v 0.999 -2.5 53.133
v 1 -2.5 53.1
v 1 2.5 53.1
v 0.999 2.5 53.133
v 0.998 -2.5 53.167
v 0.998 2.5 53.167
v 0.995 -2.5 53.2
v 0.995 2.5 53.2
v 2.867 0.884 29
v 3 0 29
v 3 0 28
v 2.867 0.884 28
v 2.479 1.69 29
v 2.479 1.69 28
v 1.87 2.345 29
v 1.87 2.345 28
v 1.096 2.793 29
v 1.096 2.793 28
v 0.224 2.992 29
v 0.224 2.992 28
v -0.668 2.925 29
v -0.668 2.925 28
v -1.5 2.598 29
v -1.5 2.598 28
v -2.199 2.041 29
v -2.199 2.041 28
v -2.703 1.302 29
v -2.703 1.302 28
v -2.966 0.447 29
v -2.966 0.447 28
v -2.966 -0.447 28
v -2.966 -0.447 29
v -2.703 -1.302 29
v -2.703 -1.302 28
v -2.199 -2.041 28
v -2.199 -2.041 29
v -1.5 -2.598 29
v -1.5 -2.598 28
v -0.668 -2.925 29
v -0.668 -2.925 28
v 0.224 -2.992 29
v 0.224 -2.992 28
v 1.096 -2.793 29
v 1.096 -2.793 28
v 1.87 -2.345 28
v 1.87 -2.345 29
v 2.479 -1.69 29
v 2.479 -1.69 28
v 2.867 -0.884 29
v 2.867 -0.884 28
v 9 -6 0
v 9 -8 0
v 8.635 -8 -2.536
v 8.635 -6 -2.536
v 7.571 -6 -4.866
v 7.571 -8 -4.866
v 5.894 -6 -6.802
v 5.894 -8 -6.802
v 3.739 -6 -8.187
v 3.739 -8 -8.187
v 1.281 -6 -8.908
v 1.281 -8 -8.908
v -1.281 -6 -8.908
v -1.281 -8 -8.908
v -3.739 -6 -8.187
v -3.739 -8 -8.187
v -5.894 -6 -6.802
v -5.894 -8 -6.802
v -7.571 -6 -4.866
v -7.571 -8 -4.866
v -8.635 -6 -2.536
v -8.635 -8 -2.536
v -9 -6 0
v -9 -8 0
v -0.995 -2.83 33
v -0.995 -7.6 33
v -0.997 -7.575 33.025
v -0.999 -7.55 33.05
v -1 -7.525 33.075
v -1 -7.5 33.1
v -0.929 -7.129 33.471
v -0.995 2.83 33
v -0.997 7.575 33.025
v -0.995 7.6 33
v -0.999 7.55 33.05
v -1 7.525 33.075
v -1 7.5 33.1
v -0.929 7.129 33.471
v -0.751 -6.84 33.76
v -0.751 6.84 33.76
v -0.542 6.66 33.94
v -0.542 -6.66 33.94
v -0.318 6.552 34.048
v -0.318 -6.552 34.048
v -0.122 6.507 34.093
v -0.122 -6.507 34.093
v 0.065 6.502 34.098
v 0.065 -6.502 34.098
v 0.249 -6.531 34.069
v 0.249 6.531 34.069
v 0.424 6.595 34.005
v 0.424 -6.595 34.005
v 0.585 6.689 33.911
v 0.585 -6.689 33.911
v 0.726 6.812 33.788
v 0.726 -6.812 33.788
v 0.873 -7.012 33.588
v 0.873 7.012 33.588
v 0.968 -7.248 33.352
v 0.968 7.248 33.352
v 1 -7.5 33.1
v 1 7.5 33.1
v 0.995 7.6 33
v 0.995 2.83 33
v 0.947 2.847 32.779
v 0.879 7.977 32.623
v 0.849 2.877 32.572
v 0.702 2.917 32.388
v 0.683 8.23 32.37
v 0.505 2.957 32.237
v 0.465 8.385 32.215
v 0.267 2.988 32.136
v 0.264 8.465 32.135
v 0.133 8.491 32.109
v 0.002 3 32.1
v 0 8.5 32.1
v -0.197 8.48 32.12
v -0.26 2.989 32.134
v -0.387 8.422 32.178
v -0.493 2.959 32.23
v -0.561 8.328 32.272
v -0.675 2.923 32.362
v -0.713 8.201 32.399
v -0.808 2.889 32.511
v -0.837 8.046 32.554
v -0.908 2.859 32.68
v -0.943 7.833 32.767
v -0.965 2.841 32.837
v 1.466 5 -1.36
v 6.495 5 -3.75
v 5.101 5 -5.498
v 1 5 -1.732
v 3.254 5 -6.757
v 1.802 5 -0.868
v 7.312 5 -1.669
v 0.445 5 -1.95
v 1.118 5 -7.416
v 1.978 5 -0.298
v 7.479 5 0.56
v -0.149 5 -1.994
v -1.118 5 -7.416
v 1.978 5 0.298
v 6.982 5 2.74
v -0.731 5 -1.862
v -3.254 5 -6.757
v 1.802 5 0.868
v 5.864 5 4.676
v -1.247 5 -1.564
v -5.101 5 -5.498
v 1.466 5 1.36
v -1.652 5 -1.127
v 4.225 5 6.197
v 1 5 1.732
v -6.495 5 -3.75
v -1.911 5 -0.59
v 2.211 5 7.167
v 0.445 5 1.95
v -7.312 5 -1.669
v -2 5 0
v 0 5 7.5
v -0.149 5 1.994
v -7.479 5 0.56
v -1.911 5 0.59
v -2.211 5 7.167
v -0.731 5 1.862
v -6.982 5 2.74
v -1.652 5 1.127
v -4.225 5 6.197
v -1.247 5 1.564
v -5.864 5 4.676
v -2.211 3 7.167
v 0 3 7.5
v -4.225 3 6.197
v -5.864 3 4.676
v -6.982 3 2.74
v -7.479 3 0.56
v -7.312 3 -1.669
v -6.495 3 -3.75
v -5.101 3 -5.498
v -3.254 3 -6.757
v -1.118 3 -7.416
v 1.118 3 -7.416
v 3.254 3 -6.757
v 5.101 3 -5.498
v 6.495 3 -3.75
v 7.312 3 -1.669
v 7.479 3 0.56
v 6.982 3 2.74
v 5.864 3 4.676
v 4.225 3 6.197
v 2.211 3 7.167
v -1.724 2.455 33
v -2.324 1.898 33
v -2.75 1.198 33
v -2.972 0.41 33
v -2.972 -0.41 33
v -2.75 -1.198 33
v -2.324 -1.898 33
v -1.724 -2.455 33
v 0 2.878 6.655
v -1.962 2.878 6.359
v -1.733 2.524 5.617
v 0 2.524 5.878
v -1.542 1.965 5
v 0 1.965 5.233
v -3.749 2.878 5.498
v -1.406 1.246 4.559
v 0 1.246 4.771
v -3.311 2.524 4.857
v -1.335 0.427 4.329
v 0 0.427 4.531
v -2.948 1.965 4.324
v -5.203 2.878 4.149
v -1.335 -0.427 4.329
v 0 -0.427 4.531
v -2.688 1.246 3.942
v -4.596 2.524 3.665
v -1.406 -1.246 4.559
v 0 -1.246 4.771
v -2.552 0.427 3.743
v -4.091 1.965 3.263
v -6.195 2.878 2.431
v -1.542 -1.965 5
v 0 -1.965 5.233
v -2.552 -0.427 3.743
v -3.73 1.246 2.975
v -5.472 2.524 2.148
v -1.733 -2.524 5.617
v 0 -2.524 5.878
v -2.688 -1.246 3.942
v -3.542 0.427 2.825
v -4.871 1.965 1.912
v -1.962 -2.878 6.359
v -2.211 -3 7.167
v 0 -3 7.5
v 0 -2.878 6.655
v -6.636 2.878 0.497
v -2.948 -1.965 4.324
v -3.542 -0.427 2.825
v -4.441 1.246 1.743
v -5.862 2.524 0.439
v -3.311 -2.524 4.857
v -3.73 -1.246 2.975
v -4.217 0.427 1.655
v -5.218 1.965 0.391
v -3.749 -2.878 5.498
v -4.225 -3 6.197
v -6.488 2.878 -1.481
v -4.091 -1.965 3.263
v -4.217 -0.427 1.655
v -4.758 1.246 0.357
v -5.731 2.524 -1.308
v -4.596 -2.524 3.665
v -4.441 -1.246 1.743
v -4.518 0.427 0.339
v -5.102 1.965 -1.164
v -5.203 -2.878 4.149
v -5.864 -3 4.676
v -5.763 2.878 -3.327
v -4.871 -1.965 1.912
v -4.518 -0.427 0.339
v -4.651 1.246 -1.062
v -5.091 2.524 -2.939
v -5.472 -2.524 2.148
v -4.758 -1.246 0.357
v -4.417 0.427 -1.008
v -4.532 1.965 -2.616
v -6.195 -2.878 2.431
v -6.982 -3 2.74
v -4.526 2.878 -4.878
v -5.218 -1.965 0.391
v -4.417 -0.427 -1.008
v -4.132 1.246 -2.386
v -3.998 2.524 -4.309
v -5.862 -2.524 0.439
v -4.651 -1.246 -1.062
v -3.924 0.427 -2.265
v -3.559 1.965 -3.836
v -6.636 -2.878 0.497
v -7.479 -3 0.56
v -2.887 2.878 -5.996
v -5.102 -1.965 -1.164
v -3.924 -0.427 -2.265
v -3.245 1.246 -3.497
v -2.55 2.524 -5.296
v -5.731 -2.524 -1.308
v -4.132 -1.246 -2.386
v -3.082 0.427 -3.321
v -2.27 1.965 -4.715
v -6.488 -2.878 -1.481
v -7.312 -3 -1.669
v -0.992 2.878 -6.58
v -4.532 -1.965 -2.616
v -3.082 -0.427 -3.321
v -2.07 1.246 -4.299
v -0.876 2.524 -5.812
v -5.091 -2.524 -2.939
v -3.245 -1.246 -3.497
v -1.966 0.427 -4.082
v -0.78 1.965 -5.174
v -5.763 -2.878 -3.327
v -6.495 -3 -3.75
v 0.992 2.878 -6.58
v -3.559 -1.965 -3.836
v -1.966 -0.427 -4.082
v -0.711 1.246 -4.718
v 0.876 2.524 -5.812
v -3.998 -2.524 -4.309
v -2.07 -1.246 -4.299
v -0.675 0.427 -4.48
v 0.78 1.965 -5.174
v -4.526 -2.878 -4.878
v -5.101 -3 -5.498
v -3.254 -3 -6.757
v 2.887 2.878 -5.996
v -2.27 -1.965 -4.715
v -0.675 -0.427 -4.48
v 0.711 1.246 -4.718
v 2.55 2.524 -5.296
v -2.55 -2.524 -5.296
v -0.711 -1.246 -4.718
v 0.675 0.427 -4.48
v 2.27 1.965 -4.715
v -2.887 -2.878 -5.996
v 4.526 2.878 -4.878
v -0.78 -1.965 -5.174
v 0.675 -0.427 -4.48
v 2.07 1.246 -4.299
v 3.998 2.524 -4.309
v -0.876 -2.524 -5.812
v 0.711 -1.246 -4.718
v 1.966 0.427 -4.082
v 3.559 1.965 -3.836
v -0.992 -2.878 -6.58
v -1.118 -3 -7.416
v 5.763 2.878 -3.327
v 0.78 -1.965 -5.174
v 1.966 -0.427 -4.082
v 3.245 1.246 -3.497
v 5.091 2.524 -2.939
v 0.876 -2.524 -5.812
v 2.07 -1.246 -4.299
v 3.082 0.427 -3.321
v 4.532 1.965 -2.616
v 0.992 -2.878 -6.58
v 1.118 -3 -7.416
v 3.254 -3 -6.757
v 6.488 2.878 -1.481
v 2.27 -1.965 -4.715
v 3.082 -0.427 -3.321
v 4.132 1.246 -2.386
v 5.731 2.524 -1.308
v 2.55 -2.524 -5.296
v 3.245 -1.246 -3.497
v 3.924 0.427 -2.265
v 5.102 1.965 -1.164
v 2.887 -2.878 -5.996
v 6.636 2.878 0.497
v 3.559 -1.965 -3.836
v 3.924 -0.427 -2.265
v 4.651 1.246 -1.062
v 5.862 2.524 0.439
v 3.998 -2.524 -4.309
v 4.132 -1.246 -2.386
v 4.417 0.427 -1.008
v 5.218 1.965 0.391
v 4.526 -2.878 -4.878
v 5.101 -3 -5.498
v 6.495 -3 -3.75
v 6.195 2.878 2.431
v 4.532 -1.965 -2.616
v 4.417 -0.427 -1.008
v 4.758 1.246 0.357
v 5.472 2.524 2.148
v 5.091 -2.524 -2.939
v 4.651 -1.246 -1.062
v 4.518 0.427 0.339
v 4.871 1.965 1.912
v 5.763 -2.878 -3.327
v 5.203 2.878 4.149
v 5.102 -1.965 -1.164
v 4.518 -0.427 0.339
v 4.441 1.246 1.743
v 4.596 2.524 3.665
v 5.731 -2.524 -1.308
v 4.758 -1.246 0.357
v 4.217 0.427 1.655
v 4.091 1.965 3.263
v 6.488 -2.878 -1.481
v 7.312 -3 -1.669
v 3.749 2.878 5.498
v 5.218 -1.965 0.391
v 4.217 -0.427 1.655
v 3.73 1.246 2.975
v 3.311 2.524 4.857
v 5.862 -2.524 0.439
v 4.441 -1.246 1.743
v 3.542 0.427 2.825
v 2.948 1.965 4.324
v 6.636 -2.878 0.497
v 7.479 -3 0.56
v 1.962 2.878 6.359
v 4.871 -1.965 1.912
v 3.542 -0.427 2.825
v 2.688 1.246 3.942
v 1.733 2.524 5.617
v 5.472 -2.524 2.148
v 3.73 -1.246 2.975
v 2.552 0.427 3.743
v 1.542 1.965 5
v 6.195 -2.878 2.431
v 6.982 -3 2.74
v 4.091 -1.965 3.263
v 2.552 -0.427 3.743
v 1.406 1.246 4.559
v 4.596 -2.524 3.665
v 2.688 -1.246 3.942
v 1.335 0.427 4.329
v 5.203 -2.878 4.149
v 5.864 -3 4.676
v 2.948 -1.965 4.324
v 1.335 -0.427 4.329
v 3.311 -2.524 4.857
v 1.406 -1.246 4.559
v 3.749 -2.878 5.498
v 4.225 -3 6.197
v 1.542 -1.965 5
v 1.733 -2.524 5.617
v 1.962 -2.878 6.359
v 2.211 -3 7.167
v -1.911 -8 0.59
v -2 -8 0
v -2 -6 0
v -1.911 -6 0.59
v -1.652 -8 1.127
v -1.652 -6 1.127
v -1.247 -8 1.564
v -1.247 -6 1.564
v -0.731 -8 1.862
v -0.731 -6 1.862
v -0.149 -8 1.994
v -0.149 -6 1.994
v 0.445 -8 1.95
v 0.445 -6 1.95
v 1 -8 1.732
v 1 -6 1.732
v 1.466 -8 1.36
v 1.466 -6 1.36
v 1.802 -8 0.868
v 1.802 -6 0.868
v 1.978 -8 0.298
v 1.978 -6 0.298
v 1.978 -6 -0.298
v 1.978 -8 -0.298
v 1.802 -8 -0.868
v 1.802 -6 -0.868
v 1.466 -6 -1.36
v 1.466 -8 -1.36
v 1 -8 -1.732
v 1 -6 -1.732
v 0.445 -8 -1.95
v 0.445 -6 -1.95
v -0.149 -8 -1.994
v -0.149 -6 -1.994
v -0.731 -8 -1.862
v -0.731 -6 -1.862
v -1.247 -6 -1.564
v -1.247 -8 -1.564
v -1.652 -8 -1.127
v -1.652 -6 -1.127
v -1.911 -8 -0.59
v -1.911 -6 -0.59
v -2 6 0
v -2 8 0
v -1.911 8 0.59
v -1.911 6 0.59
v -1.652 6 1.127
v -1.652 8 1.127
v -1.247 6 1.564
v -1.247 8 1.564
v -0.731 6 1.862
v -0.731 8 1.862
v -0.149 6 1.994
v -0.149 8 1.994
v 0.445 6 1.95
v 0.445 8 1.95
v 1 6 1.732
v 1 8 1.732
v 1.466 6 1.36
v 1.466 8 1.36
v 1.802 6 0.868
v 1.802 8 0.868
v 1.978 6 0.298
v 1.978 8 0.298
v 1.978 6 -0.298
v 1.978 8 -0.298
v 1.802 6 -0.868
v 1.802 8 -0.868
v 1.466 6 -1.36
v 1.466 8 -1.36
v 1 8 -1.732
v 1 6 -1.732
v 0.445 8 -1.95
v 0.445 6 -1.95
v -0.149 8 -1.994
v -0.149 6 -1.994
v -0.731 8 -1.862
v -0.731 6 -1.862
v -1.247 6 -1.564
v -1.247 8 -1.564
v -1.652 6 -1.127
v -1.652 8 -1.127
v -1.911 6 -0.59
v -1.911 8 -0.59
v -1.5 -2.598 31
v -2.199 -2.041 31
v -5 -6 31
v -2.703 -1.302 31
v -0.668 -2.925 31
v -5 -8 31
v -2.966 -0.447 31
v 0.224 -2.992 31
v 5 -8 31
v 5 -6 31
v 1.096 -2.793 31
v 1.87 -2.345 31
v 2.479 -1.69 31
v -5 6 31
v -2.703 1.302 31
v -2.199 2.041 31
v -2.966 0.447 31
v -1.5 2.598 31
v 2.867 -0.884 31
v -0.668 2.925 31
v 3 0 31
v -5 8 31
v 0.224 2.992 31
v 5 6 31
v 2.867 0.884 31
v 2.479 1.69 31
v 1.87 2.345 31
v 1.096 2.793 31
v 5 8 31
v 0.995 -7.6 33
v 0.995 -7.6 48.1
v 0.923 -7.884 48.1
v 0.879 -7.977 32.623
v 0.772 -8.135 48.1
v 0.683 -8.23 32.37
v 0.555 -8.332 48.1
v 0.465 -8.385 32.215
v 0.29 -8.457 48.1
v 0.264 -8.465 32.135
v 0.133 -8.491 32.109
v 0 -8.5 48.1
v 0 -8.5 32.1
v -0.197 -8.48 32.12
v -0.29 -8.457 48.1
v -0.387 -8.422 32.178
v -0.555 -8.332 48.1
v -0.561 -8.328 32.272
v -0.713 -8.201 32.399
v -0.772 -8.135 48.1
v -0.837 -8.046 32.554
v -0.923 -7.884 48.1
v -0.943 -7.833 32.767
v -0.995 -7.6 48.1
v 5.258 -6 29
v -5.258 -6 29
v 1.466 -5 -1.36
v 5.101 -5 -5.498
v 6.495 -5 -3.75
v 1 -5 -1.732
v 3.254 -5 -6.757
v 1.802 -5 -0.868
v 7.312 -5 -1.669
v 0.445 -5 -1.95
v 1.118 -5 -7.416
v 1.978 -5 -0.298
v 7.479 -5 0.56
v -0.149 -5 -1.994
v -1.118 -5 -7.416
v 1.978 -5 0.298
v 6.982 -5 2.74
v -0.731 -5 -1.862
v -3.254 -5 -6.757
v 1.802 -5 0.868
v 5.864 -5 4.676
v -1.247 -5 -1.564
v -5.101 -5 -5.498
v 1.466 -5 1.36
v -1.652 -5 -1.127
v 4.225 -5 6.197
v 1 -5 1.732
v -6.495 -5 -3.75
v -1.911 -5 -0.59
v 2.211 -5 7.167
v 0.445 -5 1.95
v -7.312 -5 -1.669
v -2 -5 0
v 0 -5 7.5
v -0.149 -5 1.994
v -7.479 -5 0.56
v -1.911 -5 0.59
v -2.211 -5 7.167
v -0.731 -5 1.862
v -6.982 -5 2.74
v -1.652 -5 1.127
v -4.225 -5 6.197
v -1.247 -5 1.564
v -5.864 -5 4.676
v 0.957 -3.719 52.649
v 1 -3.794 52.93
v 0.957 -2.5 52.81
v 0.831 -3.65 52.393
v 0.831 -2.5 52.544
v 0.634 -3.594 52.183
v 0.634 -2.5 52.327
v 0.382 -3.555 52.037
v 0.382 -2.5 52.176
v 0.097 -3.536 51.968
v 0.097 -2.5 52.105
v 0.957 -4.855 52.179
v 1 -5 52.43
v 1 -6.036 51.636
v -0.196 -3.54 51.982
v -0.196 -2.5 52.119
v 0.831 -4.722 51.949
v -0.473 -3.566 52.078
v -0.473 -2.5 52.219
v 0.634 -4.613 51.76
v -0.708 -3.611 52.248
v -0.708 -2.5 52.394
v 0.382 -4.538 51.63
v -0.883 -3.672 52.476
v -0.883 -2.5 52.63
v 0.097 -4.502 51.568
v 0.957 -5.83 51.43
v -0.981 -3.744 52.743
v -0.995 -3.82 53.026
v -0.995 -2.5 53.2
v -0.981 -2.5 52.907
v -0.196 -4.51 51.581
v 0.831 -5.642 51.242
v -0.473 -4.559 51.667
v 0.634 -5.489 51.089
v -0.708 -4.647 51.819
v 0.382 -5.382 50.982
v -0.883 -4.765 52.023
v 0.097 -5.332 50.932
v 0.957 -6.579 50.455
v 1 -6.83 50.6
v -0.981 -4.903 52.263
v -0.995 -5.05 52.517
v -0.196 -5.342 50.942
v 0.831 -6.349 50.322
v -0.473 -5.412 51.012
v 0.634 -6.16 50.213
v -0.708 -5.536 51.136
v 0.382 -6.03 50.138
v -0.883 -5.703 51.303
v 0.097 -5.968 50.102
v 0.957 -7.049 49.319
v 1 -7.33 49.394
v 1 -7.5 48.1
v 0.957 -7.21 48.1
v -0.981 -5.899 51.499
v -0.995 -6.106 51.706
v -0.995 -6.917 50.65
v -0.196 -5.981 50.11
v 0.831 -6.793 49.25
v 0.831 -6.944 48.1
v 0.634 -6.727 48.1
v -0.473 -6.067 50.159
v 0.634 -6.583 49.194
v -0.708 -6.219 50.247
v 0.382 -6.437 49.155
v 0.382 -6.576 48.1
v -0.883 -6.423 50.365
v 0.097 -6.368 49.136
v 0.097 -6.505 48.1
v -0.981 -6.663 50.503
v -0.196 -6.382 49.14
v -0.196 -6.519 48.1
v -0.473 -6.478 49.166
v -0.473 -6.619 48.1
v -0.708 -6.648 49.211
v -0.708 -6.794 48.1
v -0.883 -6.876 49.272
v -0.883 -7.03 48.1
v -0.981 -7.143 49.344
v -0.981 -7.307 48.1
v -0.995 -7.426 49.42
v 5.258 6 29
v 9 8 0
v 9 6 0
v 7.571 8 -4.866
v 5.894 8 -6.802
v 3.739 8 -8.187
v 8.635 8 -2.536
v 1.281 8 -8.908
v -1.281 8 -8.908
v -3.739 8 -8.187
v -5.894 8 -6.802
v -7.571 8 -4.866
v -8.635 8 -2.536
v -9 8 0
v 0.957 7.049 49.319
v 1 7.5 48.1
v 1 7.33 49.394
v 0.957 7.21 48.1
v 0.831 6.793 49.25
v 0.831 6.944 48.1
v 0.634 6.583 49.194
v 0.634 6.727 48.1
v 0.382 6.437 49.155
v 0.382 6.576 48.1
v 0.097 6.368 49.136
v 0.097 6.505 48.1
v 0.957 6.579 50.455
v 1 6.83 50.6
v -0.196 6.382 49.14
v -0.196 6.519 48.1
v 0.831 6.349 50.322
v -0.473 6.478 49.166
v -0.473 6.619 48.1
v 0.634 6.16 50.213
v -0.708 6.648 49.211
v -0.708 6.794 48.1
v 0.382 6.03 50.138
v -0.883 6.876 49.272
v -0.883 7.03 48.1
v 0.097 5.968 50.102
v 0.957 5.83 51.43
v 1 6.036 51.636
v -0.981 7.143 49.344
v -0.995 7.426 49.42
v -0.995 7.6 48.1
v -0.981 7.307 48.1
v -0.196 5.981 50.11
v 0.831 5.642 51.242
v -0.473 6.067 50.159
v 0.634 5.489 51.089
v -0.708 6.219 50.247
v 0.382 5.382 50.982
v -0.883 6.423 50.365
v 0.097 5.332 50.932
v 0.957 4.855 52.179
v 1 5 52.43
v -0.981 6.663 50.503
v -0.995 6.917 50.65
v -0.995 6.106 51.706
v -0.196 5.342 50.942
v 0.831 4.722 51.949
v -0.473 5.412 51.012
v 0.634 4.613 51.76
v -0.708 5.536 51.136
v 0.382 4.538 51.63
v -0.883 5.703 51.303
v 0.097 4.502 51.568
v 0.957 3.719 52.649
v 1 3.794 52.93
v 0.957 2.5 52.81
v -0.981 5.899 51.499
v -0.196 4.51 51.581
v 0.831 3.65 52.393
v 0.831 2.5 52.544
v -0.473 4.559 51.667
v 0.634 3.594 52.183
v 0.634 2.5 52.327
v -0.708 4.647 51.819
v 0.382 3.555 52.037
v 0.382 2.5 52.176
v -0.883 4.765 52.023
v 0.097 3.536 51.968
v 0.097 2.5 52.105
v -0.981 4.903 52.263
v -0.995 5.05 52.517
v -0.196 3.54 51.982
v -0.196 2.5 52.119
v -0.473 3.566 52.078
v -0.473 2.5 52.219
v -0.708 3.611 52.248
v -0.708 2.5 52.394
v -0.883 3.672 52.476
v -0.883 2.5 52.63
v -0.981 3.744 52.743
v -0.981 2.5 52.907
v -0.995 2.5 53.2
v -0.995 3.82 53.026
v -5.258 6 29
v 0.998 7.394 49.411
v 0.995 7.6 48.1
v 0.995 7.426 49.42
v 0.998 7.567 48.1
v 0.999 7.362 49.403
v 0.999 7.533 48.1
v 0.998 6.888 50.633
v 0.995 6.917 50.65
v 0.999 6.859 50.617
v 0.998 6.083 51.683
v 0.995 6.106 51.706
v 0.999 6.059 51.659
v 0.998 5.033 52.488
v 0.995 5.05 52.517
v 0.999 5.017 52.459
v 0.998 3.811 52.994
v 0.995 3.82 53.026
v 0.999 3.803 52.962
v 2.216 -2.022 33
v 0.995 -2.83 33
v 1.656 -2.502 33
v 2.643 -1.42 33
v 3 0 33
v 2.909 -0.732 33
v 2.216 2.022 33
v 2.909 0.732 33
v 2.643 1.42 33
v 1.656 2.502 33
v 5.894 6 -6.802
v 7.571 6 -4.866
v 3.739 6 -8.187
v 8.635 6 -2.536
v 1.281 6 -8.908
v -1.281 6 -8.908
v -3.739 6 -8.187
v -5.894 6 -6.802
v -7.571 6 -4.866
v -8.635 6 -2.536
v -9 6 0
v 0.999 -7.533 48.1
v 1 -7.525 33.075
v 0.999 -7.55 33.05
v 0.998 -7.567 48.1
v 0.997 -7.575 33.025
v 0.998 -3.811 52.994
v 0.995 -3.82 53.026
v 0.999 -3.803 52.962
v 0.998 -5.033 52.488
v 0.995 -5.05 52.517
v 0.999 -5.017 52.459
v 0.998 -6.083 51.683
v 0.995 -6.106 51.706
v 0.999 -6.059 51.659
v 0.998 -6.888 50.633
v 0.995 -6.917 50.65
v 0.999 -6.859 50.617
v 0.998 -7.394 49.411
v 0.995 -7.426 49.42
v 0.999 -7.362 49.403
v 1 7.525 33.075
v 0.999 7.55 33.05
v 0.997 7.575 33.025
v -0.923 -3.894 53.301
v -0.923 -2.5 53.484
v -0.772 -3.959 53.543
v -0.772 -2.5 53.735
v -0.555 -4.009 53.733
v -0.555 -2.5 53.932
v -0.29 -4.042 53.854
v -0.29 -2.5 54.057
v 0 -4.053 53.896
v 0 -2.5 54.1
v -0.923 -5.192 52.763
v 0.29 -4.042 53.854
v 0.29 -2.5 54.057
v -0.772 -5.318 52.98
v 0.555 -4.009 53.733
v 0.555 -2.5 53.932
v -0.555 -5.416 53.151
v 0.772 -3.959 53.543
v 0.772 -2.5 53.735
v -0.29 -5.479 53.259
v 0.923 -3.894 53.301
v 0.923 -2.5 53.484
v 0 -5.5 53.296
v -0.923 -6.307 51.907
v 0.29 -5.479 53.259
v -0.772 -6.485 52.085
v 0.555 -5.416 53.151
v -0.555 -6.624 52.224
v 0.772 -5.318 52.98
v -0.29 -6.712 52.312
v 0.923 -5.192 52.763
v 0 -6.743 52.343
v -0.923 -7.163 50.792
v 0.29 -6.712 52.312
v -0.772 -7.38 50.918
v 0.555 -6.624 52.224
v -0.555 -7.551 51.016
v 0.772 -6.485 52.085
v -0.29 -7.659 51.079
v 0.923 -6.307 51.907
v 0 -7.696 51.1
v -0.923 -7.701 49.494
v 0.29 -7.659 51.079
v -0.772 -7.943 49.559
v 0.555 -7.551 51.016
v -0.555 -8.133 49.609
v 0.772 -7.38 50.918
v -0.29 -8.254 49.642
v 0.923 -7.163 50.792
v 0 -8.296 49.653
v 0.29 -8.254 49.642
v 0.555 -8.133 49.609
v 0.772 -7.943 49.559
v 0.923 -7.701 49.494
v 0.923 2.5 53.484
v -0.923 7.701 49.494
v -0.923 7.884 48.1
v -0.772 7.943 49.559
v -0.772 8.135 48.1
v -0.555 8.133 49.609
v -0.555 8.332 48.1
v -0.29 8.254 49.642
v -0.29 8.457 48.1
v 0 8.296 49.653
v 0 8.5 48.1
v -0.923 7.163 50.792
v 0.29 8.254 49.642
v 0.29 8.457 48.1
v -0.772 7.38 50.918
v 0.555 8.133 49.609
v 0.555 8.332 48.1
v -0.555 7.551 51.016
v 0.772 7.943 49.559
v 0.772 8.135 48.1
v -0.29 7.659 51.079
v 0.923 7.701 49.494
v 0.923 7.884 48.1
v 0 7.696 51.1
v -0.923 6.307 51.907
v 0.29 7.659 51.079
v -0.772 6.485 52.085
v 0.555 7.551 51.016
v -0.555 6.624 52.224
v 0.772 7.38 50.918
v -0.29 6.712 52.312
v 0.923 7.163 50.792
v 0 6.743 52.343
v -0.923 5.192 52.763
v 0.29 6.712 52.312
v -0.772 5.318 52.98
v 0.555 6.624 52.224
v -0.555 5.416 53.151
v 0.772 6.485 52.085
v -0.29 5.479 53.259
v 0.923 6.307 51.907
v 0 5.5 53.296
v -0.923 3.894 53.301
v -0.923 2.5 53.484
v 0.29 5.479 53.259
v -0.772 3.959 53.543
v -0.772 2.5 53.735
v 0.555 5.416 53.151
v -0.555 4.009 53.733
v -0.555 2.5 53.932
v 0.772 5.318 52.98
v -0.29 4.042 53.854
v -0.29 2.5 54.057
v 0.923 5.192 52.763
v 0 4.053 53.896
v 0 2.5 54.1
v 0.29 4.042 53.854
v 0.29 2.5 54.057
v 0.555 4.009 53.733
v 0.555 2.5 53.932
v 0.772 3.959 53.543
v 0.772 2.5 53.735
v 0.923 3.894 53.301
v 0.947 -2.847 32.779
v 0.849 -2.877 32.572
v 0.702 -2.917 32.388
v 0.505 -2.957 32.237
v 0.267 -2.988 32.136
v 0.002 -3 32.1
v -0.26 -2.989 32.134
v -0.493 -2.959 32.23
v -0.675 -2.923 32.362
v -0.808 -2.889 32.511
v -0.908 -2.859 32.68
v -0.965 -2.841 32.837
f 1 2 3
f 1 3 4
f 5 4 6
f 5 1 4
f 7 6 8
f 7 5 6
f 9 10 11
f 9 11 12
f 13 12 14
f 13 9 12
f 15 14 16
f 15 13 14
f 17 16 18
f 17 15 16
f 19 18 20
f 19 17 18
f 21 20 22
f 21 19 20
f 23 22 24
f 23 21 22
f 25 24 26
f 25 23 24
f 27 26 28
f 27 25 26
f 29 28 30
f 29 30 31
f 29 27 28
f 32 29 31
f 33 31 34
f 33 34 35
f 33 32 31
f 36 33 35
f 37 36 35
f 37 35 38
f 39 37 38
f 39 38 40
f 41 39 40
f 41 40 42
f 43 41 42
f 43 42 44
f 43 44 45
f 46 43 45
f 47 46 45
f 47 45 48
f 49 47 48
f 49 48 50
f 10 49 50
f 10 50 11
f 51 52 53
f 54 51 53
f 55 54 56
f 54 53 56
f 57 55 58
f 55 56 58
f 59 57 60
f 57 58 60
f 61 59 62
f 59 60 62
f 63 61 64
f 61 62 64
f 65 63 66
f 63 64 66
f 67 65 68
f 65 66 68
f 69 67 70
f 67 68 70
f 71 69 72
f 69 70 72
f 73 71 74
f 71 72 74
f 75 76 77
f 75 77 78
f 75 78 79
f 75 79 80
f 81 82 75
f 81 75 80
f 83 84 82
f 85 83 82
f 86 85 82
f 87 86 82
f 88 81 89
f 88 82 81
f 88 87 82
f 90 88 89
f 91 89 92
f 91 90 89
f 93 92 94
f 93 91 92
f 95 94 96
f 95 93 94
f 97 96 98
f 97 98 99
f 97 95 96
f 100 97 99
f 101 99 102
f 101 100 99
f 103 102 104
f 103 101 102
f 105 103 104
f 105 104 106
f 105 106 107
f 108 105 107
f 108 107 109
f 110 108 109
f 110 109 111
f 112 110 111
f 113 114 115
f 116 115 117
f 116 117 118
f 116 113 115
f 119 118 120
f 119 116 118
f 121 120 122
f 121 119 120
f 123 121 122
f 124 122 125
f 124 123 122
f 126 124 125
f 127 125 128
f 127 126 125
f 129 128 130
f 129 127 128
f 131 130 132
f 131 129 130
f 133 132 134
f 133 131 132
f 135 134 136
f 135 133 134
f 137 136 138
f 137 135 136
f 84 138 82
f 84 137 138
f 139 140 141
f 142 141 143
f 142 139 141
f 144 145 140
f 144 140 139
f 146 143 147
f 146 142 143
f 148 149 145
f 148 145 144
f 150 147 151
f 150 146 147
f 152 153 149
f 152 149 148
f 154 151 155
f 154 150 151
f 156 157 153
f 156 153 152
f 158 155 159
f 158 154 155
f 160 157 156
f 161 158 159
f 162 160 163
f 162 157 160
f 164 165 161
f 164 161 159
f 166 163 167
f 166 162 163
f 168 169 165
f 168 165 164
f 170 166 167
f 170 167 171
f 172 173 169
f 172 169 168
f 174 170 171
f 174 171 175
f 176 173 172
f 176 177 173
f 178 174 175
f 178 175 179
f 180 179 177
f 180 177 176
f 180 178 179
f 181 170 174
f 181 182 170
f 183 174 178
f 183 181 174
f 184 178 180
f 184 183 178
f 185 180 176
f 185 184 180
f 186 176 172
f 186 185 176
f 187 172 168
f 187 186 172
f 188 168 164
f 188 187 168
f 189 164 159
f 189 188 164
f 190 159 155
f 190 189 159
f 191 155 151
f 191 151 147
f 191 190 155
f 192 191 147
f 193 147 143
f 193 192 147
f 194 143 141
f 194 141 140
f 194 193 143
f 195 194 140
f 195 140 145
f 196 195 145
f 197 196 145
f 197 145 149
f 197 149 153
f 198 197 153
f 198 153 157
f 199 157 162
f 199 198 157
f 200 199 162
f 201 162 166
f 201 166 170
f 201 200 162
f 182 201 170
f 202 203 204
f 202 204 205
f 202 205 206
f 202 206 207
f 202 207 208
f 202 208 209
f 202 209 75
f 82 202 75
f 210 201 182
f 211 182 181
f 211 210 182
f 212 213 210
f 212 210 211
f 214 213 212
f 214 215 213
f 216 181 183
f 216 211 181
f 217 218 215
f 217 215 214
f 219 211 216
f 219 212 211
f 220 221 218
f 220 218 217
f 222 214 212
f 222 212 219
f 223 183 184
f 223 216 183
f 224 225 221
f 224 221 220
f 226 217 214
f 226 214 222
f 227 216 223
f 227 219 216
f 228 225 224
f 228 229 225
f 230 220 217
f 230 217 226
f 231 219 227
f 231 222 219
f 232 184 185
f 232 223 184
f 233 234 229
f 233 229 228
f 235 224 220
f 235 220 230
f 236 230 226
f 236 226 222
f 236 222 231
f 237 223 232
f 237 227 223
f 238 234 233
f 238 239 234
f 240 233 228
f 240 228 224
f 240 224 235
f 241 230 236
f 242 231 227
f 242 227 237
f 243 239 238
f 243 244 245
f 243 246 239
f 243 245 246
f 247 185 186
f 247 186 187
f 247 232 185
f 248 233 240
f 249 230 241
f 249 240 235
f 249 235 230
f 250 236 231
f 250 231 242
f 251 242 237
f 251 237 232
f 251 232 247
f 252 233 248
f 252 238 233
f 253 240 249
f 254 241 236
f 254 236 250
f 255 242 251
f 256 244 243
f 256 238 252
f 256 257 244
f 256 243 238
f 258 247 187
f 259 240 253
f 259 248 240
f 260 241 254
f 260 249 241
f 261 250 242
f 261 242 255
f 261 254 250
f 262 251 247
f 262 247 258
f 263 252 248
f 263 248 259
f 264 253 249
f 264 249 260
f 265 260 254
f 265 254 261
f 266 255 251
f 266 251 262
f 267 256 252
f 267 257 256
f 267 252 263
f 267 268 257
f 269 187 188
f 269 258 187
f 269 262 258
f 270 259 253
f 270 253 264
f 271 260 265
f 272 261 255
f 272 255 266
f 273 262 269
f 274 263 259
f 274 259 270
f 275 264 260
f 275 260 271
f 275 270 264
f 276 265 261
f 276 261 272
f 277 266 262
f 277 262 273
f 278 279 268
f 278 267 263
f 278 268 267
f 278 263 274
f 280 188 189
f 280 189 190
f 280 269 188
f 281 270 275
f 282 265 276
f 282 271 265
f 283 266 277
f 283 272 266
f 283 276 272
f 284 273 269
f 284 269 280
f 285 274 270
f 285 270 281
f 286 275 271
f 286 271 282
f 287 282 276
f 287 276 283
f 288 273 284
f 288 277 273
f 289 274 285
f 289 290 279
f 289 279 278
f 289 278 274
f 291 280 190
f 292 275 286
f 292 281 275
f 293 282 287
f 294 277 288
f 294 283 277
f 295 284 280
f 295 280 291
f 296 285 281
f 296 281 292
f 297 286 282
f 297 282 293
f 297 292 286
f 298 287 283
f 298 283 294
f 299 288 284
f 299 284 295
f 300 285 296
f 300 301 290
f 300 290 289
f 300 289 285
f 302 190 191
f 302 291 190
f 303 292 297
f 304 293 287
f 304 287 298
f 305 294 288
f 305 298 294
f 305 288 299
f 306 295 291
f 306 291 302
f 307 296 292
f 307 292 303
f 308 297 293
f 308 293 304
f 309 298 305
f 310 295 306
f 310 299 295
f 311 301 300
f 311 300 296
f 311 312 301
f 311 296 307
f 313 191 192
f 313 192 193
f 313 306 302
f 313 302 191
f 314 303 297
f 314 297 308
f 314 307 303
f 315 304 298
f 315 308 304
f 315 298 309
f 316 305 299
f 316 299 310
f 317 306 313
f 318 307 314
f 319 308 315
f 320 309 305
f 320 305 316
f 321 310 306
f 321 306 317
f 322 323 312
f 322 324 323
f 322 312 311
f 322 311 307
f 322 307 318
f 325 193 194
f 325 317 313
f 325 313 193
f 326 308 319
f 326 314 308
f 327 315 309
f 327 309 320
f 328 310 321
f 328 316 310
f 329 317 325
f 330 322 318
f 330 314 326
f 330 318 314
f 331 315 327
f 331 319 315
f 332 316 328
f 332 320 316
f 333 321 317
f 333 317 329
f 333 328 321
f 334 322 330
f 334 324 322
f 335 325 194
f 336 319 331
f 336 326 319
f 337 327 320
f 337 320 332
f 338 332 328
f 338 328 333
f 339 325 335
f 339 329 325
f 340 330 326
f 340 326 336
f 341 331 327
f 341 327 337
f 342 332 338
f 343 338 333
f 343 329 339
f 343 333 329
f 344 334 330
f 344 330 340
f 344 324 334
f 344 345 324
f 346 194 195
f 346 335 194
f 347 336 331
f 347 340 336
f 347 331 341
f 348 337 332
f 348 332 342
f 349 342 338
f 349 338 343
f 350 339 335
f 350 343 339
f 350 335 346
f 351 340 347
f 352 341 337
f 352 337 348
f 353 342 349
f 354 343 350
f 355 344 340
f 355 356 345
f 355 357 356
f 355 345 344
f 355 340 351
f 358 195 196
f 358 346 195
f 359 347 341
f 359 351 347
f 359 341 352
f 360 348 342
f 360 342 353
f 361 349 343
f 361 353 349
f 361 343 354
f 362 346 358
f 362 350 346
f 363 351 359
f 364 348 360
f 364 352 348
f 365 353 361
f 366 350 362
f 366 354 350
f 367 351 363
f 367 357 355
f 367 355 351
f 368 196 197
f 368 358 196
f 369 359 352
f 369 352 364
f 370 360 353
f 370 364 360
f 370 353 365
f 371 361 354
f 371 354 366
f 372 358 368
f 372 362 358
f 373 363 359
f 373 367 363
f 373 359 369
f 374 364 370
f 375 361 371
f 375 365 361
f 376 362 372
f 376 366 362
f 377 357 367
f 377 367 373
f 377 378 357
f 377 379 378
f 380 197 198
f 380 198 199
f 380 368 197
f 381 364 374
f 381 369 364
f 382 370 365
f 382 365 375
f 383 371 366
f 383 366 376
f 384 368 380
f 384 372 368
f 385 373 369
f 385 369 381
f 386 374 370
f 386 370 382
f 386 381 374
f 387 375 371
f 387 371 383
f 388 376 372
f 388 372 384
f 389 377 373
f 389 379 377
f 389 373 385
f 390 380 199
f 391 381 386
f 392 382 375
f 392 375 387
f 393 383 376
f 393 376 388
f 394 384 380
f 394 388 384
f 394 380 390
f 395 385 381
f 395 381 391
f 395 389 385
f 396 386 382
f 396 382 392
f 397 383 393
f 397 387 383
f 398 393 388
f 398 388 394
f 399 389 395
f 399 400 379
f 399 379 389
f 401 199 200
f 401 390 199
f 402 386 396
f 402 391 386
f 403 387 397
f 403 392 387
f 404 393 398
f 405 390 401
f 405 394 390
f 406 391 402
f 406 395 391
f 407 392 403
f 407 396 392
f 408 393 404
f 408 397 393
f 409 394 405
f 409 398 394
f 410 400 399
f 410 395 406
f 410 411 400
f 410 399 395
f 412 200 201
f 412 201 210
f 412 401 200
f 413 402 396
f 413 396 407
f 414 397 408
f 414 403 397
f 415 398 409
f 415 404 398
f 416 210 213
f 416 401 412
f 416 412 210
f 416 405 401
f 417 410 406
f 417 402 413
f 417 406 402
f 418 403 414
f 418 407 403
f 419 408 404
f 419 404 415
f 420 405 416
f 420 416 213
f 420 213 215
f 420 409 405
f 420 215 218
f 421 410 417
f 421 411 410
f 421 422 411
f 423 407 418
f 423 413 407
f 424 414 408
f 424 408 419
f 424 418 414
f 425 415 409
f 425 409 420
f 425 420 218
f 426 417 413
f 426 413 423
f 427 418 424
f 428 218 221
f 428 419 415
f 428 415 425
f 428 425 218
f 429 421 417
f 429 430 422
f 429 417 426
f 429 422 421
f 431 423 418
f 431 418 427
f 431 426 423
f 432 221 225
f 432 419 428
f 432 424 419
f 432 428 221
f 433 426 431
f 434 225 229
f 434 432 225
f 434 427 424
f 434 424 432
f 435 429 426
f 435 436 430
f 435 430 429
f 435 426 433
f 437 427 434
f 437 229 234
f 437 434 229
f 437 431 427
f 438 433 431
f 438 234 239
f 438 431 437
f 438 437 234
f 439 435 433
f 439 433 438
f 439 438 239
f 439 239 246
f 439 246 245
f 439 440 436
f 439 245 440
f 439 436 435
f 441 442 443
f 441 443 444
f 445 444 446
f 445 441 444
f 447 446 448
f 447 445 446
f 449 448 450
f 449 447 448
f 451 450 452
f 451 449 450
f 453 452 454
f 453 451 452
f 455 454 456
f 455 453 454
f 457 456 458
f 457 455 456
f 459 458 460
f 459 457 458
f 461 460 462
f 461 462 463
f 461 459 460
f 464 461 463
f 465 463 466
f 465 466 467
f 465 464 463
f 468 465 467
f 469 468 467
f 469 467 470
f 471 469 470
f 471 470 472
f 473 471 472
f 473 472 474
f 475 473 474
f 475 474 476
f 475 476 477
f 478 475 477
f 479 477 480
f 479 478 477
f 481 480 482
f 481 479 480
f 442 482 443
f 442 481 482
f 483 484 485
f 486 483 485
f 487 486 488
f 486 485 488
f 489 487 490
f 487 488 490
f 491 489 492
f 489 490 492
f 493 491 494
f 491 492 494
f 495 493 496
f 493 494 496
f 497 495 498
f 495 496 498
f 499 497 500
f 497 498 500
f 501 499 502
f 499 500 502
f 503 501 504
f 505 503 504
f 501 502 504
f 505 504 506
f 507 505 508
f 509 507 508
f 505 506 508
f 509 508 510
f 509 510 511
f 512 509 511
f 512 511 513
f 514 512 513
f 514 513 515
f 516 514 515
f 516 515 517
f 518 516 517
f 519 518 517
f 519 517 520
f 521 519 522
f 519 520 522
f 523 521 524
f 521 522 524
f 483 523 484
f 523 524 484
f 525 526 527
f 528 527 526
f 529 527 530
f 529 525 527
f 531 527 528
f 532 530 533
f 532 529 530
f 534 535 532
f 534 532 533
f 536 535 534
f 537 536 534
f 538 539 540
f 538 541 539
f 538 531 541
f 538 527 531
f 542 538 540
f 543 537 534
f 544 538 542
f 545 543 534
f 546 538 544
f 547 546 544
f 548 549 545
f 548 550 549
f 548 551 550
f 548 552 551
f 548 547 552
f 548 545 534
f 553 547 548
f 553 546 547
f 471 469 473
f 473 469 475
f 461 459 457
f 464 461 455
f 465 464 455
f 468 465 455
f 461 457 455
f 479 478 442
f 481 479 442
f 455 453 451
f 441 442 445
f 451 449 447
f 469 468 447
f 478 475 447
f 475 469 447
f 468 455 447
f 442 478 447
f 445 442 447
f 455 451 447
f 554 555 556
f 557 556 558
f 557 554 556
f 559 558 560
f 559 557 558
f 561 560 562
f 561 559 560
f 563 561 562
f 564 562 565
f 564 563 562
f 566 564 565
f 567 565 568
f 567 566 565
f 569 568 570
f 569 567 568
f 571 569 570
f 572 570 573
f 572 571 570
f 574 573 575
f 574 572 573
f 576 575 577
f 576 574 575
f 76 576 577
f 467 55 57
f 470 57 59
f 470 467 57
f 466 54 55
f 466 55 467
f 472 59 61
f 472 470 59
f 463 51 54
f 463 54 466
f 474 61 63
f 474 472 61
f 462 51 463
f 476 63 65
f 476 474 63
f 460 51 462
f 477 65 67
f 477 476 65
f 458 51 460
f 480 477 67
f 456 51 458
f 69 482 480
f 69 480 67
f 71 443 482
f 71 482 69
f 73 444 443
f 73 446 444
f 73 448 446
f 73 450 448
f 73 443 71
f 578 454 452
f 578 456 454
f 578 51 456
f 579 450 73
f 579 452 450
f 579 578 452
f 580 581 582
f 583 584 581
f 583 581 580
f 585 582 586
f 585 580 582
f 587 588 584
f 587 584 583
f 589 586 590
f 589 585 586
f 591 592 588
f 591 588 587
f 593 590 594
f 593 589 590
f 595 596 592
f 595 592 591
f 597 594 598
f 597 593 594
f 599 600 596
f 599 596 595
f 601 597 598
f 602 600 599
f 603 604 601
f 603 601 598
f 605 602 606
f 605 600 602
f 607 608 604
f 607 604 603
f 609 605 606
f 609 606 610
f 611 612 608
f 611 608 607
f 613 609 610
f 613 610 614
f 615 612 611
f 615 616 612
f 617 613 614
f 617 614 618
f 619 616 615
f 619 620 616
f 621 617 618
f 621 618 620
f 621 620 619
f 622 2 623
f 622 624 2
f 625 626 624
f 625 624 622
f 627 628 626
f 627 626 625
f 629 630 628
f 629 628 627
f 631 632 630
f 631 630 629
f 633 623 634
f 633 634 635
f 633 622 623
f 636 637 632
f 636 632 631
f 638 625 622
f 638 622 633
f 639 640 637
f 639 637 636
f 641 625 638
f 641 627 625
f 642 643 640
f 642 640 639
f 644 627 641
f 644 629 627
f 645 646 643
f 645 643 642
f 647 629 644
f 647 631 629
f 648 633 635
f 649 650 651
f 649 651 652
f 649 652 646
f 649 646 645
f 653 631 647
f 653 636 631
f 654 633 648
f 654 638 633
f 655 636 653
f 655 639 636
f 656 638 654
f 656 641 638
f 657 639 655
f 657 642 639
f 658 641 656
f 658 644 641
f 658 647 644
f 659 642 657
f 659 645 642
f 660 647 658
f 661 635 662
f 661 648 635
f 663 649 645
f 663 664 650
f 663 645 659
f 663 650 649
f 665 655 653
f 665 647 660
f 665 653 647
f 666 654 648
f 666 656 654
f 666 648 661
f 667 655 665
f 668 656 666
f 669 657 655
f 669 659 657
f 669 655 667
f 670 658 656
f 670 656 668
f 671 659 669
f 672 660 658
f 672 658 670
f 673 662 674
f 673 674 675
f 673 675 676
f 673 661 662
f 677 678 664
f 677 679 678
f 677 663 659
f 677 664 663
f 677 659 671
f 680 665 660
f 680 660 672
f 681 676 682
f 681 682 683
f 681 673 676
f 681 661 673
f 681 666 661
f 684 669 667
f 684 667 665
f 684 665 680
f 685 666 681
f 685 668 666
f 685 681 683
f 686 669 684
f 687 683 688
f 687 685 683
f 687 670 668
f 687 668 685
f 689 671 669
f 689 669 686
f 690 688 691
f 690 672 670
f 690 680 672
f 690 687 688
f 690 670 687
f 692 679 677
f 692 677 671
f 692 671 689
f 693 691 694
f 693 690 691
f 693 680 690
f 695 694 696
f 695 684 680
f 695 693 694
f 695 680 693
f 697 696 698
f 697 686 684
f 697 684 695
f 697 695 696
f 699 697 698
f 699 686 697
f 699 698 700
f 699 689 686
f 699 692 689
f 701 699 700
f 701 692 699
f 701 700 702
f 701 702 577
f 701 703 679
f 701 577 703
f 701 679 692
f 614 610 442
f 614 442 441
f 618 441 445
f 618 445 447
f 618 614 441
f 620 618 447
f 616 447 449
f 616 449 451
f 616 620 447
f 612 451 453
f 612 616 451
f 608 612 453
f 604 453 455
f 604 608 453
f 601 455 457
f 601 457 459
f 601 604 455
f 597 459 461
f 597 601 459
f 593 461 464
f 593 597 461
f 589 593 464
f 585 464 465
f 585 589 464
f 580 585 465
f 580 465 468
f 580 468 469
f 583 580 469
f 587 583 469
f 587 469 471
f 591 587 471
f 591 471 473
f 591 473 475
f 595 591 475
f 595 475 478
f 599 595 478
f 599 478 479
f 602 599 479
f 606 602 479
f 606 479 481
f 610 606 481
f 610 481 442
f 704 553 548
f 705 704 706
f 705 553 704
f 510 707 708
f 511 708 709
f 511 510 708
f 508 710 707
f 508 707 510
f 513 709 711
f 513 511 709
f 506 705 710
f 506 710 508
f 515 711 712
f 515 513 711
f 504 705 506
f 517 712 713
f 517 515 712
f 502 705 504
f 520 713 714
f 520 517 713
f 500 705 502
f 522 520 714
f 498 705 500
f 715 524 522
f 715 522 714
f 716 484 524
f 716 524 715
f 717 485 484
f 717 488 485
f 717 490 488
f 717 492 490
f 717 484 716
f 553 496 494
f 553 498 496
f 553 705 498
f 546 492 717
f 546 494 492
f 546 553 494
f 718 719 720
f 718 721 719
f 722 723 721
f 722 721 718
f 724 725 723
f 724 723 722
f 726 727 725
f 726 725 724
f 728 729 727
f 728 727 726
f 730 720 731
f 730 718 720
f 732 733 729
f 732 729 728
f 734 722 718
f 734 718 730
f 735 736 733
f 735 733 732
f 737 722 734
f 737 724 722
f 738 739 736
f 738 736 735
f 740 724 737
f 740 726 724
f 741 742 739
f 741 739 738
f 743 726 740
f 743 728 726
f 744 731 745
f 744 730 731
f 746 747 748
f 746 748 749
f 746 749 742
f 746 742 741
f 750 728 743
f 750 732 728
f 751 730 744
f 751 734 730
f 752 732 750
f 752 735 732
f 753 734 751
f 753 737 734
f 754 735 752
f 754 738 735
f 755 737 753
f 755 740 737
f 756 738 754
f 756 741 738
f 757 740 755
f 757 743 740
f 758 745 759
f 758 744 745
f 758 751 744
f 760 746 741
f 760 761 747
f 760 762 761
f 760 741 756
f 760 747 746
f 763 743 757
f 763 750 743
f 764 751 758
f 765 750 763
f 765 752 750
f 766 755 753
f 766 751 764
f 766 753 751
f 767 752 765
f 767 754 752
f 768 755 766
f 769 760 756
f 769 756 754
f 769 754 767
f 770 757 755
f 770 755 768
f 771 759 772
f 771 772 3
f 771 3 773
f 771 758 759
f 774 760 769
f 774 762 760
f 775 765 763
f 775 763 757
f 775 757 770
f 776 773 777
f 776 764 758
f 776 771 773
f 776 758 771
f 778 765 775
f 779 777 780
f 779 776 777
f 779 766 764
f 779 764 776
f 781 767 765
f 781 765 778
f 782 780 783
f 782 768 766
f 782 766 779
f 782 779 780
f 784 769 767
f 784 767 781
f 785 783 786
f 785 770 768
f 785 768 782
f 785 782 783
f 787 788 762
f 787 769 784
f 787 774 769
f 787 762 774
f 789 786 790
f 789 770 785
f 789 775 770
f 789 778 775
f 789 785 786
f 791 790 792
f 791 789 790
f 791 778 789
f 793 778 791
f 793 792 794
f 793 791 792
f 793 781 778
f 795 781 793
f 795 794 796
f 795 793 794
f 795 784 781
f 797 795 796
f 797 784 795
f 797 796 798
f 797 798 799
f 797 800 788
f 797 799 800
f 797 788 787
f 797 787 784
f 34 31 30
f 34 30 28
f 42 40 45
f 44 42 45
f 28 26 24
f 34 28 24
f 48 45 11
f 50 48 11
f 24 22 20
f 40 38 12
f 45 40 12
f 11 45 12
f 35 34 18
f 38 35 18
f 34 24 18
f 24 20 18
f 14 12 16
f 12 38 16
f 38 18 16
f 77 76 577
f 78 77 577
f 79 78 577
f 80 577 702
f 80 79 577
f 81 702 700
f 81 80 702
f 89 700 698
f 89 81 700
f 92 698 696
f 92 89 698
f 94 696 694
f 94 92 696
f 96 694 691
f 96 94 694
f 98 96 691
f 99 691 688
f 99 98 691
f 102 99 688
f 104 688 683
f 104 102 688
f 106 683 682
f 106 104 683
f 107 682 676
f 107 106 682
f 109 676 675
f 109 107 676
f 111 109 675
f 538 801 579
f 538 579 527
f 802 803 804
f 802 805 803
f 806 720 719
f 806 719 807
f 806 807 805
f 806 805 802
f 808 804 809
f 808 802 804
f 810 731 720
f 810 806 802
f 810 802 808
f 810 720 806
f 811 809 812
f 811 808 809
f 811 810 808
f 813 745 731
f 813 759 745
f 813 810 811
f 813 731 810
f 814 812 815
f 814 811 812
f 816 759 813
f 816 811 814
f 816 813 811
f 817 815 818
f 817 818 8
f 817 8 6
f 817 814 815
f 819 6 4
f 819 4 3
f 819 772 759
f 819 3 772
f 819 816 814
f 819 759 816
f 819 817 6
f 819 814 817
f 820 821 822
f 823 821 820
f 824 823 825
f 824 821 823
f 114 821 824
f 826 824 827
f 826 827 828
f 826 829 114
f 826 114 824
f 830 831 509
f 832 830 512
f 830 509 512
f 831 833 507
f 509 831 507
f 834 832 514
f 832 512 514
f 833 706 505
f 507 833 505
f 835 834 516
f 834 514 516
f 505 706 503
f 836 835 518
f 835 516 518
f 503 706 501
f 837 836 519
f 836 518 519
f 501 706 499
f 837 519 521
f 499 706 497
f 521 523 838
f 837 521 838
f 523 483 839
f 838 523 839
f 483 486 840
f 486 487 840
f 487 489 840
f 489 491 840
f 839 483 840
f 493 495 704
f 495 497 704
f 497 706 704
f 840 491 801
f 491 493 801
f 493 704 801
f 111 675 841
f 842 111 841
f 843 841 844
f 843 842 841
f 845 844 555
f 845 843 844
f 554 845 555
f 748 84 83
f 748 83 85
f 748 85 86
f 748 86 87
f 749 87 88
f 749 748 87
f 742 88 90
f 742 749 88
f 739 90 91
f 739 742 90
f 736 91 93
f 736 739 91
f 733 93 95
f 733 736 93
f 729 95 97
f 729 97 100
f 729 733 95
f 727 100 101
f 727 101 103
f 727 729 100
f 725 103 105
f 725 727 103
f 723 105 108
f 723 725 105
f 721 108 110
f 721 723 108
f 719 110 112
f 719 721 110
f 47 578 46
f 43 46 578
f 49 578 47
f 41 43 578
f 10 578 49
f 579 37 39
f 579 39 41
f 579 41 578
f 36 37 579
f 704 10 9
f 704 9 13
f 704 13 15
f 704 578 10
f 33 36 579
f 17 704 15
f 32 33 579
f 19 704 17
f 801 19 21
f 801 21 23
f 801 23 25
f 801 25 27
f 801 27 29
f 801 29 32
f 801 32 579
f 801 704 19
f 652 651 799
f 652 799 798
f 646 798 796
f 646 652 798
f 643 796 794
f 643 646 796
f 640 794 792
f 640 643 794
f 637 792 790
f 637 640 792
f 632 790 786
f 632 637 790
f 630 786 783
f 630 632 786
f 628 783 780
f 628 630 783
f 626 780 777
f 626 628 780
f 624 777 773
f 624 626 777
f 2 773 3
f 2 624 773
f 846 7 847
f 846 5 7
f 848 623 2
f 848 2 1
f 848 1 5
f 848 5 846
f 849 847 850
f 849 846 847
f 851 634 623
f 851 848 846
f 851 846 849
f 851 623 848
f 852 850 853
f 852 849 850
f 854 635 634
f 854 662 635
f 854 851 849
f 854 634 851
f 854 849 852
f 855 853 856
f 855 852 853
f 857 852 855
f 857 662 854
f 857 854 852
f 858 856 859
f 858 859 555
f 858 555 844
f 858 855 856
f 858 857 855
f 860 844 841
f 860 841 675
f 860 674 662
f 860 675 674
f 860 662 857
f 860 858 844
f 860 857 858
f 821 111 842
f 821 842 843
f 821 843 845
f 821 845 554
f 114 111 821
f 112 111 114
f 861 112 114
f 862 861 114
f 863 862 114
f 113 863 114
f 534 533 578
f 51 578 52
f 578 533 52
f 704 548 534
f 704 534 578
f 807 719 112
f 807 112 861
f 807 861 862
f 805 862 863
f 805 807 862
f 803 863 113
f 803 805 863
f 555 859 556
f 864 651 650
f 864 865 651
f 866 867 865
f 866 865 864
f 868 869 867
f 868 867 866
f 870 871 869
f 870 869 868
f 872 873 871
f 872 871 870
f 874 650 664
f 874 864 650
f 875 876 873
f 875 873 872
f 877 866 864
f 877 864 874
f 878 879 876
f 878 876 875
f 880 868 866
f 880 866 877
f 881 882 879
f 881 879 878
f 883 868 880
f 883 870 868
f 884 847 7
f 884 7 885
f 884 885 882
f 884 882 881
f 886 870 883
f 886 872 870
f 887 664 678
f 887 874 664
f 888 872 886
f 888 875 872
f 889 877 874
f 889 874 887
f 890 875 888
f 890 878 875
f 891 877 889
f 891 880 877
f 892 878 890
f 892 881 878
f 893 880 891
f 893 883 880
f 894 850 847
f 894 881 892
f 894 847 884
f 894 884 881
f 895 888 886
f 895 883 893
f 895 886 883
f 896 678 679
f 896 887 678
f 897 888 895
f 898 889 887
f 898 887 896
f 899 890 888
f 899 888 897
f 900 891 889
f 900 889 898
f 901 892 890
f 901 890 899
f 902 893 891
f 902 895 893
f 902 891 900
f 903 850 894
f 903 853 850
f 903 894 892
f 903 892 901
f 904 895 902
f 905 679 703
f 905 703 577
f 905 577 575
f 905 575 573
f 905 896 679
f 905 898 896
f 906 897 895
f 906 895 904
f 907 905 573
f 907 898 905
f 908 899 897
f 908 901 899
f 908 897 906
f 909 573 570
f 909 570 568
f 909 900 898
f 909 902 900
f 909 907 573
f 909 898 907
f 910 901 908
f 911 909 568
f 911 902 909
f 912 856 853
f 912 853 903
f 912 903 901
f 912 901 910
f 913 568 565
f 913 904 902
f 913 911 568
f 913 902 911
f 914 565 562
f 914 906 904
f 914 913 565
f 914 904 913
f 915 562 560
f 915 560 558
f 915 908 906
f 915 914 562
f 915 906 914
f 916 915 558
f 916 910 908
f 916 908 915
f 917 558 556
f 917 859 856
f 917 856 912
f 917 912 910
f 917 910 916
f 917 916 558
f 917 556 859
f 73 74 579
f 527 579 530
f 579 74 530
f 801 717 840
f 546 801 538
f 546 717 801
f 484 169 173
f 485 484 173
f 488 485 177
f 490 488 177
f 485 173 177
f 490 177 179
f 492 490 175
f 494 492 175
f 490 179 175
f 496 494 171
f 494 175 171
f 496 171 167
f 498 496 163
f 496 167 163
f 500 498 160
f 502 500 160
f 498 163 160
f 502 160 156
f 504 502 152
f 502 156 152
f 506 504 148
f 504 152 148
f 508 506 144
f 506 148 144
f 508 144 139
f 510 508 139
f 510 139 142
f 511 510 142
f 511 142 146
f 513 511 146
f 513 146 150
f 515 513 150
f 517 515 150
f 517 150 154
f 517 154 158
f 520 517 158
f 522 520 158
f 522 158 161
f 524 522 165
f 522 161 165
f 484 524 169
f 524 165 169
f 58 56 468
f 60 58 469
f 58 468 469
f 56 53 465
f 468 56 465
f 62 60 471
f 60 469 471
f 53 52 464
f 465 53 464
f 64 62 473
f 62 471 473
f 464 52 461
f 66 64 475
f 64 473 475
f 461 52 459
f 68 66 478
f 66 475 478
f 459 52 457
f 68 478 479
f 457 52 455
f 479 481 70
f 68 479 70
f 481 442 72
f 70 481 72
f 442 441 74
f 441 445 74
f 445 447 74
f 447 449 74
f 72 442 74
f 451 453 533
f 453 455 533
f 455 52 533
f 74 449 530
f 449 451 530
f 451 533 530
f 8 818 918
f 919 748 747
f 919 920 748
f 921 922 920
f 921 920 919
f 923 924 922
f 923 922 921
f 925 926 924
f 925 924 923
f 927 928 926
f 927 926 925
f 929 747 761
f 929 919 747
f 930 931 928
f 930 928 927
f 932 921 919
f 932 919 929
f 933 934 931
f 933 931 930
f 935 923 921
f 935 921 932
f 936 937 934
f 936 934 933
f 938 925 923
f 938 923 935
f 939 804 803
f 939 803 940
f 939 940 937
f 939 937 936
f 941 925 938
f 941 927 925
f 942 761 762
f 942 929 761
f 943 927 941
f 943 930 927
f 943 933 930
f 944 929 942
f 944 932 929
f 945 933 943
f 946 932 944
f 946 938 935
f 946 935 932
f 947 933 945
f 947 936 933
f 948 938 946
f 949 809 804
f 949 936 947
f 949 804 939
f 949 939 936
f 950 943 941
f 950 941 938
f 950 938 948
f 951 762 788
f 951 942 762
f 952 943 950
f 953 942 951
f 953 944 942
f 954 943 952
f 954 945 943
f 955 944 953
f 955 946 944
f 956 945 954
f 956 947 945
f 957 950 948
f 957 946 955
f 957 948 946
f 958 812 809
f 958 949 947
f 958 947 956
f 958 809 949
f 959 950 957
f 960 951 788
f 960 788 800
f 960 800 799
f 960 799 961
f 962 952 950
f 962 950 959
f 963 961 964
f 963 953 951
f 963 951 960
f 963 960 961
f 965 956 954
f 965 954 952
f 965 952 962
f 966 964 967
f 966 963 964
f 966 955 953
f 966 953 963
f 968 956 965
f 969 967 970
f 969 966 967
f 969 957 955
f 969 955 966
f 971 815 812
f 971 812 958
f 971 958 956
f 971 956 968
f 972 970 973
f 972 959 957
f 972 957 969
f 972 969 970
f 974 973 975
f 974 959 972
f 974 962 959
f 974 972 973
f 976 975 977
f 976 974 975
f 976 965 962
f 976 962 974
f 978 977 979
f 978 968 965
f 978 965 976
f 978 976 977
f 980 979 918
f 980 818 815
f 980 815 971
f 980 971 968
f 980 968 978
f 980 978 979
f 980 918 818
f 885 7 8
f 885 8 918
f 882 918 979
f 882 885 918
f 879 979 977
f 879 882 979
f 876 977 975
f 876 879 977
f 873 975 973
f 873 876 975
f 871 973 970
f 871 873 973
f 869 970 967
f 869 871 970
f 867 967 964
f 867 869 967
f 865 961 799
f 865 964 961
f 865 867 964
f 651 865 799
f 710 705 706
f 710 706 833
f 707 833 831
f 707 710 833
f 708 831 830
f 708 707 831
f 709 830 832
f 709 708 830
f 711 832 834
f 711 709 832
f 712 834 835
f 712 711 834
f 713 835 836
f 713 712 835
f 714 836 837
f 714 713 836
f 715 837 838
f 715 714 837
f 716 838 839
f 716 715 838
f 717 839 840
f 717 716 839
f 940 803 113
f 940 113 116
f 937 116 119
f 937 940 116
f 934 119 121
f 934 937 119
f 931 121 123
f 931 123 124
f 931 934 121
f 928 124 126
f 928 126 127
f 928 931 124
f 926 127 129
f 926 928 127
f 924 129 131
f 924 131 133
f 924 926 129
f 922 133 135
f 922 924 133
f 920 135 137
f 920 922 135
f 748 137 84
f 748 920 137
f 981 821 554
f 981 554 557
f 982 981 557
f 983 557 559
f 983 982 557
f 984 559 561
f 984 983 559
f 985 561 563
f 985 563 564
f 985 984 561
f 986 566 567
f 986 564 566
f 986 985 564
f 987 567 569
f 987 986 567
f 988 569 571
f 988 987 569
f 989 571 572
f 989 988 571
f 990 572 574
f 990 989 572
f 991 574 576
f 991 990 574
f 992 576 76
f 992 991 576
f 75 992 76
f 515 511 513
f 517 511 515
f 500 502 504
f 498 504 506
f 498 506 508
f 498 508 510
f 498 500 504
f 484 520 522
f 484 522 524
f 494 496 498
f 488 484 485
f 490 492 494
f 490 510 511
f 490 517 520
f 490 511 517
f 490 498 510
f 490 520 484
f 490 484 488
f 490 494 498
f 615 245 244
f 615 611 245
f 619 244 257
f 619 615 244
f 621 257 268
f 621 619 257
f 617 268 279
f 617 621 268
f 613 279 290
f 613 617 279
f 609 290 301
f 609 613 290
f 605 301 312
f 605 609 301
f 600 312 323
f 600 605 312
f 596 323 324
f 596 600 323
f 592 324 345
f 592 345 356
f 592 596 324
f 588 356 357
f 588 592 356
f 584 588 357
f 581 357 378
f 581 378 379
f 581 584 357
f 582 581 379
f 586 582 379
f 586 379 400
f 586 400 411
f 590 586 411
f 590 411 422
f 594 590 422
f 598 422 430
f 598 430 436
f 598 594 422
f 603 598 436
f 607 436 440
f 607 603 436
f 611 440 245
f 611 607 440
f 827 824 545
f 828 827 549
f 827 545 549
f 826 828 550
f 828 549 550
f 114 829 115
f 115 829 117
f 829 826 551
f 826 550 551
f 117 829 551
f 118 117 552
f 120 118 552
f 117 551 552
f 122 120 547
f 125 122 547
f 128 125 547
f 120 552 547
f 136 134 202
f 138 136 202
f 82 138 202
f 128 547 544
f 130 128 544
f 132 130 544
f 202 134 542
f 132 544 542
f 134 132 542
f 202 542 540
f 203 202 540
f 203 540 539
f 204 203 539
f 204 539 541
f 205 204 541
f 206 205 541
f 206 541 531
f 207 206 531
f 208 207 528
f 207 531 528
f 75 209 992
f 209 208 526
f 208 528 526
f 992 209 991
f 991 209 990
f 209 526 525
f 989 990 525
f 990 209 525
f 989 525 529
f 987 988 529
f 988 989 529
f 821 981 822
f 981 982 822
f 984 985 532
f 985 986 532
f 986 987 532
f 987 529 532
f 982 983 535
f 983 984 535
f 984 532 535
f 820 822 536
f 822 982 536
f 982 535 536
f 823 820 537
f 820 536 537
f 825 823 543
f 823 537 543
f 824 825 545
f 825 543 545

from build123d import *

# Parameters (mm, degrees)
F2_R           = 2
F3_DEPTH       = 13
F3_DEPTH_BACK  = 3
F4_R           = 7.5
F4_R_2         = 2
F5_DEPTH       = 2
F8_DEPTH       = 14
F9_R           = 3
F10_DEPTH      = 2
F10_DEPTH_BACK = 3


with BuildPart() as f1:
    # F0 (on Right) → F1 (revolve)
    with BuildSketch(Plane.YZ):
        with BuildLine():
            Line((-5, 0), (0, 0))
            Line((0, 0), (5, 0))
            Line((5, 0), (5, 7.5))
            Line((5, 7.5), (3, 7.5))
            ThreePointArc((3, 7.5), (0, 4.5), (-3, 7.5))
            Line((-3, 7.5), (-5, 7.5))
            Line((-5, 7.5), (-5, 0))
        make_face()
    revolve(axis=Axis((0, -2.5, 0), (0, -1, 0)))

    # F2 (on face) → F3 (join, two sides)
    with BuildSketch(Plane(origin=(0, 5, 0), x_dir=(-1, 0, 0), z_dir=(0, 1, 0))) as f3_sk:
        Circle(F2_R)
    extrude(amount=-F3_DEPTH)
    extrude(f3_sk.sketch, amount=F3_DEPTH_BACK)


with BuildPart() as f5:
    # F4 (on face) → F5 (new body)
    with BuildSketch(Plane(origin=(0, 8, 0), x_dir=(-1, 0, 0), z_dir=(0, 1, 0))):
        with BuildLine():
            Line((-5, 31), (-9, 0))
            ThreePointArc((-9, 0), (0, -9), (9, 0))
            Line((9, 0), (5, 31))
            Line((5, 31), (0, 31))
            Line((0, 31), (-5, 31))
        make_face()
        Circle(F4_R, mode=Mode.SUBTRACT)
        Circle(F4_R)
        Circle(F4_R_2, mode=Mode.SUBTRACT)
    extrude(amount=-F5_DEPTH)


with BuildPart() as f6_1:
    # F6: instance of F5
    add(f5.part.mirror(Plane.XZ))


with BuildPart() as f5_1:
    add(f5.part)

    add(f6_1.part)  # F8 merges F6_1
    # F7 (on face) → F8 (join, through all)
    with BuildSketch(Plane(origin=(0, 8, 0), x_dir=(-1, 0, 0), z_dir=(0, 1, 0))):
        Polygon((5, 31), (-5, 31), (-5.2580645161, 29), (0, 29), (5.2580645161, 29), align=None)
    extrude(amount=-F8_DEPTH)

    # F9 (on face) → F10 (join, two sides)
    with BuildSketch(Plane.XY.offset(31)) as f10_sk:
        Circle(F9_R)
    extrude(amount=F10_DEPTH)
    extrude(f10_sk.sketch, amount=-F10_DEPTH_BACK)

    # F13: sweep along a path in F12
    with BuildLine(Plane.YZ) as f13_path:
        Line((0, 33.1), (7.5, 33.1))
        Line((7.5, 33.1), (7.5, 48.1))
        ThreePointArc((7.5, 48.1), (6.0355339059, 51.6355339059), (2.5, 53.1))
        Line((2.5, 53.1), (-2.5, 53.1))
        ThreePointArc((-2.5, 53.1), (-6.0355339059, 51.6355339059), (-7.5, 48.1))
        Line((-7.5, 48.1), (-7.5, 33.1))
        Line((-7.5, 33.1), (0, 33.1))
    # F11 (on Front) → F13 (sweep)
    with BuildSketch(Plane.XZ):
        with BuildLine():
            Line((0.9949874371, 33), (-0.9949874371, 33))
            ThreePointArc((-0.9949874371, 33), (0, 32.1), (0.9949874371, 33))
        make_face()
        with BuildLine():
            ThreePointArc((1, 33.1), (-0.0500627751, 34.0987460731), (-0.9949874371, 33))
            Line((-0.9949874371, 33), (0.9949874371, 33))
            ThreePointArc((0.9949874371, 33), (0.9987460731, 33.0499372249), (1, 33.1))
        make_face()
    sweep(path=f13_path.line, transition=Transition.RIGHT)


solid = Compound([f1.part, f5_1.part])
